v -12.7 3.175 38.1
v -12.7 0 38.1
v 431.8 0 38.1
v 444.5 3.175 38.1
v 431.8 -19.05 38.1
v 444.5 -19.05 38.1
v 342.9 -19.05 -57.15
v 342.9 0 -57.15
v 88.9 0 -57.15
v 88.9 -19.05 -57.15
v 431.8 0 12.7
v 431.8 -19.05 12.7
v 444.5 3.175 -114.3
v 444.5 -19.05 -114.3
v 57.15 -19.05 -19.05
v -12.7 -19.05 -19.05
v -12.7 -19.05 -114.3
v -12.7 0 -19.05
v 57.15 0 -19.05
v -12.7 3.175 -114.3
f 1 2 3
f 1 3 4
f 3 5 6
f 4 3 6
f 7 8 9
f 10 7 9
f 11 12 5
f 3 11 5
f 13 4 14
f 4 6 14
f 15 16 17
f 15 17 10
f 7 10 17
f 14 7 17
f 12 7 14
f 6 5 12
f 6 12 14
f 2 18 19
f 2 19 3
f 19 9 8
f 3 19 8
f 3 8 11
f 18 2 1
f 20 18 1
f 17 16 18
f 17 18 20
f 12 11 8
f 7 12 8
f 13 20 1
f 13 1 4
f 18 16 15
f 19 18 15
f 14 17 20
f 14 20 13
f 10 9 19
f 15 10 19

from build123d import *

# Parameters (mm, degrees)
BOSS_EXTRUDE1_DEPTH = 19.05
SKETCH2_R           = 3.96875
CUT_EXTRUDE1_DEPTH  = 19.05
SKETCH3_W           = 457.2
SKETCH3_H           = 152.4
BOSS_EXTRUDE3_DEPTH = 19.05
SKETCH4_W           = 457.2
SKETCH4_H           = 152.4
CUT_EXTRUDE2_DEPTH  = 25.4
CUT_EXTRUDE4_DEPTH  = 25.4
SKETCH6_W           = 457.2
SKETCH6_H           = 152.4
BOSS_EXTRUDE4_DEPTH = 3.175


with BuildPart() as part:
    # Sketch1 → Boss-Extrude1 (new body)
    with BuildSketch(Plane(origin=(0, 0, 0), x_dir=(1, 0, 0), z_dir=(0, 1, 0))):
        Polygon((57.15, 19.05), (0, 19.05), (0, 0), (66.037825848, 0), (97.808358016, 38.1), (336.311308439, 38.1), (400.965853894, -12.7), (431.8, -12.7), (342.9, 57.15), (88.9, 57.15), align=None)
    extrude(amount=BOSS_EXTRUDE1_DEPTH)

    # Sketch2 → Cut-Extrude1 (cut)
    with BuildSketch(Plane.XY):
        with Locations((8.89, 9.525)):
            Circle(SKETCH2_R)
        with Locations((56.515, 9.525)):
            Circle(SKETCH2_R)
    extrude(amount=-CUT_EXTRUDE1_DEPTH, mode=Mode.SUBTRACT)

    # Sketch4 → Cut-Extrude2 (cut)
    with BuildSketch(Plane(origin=(0, 0, 0), x_dir=(1, 0, 0), z_dir=(0, 1, 0))):
        with Locations((215.9, 38.1)):
            Rectangle(SKETCH4_W, SKETCH4_H)
    extrude(amount=CUT_EXTRUDE2_DEPTH, mode=Mode.SUBTRACT)


with BuildPart() as body_2:
    # Sketch3 → Boss-Extrude3 (new body)
    with BuildSketch(Plane.XZ):
        with Locations((215.9, -38.1)):
            Rectangle(SKETCH3_W, SKETCH3_H)
        Polygon((400.965853894, 12.7), (431.8, 12.7), (342.9, -57.15), (88.9, -57.15), (57.15, -19.05), (0, -19.05), (0, 0), (66.037825848, 0), (97.808358016, -38.1), (336.311308439, -38.1), align=None, mode=Mode.SUBTRACT)
    extrude(amount=BOSS_EXTRUDE3_DEPTH)

    # Sketch5 → Cut-Extrude4 (cut)
    with BuildSketch(Plane.XZ.offset(19.05)):
        Polygon((-12.7, -19.05), (0, -19.05), (0, 0), (66.037825848, 0), (97.808358016, -38.1), (336.311308439, -38.1), (400.965853894, 12.7), (431.8, 12.7), (431.8, 38.1), (-12.7, 38.1), align=None)
    extrude(amount=-CUT_EXTRUDE4_DEPTH, mode=Mode.SUBTRACT)

    # Sketch6 → Boss-Extrude4 (add)
    with BuildSketch(Plane(origin=(0, 0, 0), x_dir=(1, 0, 0), z_dir=(0, 1, 0))):
        with Locations((215.9, 38.1)):
            Rectangle(SKETCH6_W, SKETCH6_H)
    extrude(amount=BOSS_EXTRUDE4_DEPTH)


solid = body_2.part
